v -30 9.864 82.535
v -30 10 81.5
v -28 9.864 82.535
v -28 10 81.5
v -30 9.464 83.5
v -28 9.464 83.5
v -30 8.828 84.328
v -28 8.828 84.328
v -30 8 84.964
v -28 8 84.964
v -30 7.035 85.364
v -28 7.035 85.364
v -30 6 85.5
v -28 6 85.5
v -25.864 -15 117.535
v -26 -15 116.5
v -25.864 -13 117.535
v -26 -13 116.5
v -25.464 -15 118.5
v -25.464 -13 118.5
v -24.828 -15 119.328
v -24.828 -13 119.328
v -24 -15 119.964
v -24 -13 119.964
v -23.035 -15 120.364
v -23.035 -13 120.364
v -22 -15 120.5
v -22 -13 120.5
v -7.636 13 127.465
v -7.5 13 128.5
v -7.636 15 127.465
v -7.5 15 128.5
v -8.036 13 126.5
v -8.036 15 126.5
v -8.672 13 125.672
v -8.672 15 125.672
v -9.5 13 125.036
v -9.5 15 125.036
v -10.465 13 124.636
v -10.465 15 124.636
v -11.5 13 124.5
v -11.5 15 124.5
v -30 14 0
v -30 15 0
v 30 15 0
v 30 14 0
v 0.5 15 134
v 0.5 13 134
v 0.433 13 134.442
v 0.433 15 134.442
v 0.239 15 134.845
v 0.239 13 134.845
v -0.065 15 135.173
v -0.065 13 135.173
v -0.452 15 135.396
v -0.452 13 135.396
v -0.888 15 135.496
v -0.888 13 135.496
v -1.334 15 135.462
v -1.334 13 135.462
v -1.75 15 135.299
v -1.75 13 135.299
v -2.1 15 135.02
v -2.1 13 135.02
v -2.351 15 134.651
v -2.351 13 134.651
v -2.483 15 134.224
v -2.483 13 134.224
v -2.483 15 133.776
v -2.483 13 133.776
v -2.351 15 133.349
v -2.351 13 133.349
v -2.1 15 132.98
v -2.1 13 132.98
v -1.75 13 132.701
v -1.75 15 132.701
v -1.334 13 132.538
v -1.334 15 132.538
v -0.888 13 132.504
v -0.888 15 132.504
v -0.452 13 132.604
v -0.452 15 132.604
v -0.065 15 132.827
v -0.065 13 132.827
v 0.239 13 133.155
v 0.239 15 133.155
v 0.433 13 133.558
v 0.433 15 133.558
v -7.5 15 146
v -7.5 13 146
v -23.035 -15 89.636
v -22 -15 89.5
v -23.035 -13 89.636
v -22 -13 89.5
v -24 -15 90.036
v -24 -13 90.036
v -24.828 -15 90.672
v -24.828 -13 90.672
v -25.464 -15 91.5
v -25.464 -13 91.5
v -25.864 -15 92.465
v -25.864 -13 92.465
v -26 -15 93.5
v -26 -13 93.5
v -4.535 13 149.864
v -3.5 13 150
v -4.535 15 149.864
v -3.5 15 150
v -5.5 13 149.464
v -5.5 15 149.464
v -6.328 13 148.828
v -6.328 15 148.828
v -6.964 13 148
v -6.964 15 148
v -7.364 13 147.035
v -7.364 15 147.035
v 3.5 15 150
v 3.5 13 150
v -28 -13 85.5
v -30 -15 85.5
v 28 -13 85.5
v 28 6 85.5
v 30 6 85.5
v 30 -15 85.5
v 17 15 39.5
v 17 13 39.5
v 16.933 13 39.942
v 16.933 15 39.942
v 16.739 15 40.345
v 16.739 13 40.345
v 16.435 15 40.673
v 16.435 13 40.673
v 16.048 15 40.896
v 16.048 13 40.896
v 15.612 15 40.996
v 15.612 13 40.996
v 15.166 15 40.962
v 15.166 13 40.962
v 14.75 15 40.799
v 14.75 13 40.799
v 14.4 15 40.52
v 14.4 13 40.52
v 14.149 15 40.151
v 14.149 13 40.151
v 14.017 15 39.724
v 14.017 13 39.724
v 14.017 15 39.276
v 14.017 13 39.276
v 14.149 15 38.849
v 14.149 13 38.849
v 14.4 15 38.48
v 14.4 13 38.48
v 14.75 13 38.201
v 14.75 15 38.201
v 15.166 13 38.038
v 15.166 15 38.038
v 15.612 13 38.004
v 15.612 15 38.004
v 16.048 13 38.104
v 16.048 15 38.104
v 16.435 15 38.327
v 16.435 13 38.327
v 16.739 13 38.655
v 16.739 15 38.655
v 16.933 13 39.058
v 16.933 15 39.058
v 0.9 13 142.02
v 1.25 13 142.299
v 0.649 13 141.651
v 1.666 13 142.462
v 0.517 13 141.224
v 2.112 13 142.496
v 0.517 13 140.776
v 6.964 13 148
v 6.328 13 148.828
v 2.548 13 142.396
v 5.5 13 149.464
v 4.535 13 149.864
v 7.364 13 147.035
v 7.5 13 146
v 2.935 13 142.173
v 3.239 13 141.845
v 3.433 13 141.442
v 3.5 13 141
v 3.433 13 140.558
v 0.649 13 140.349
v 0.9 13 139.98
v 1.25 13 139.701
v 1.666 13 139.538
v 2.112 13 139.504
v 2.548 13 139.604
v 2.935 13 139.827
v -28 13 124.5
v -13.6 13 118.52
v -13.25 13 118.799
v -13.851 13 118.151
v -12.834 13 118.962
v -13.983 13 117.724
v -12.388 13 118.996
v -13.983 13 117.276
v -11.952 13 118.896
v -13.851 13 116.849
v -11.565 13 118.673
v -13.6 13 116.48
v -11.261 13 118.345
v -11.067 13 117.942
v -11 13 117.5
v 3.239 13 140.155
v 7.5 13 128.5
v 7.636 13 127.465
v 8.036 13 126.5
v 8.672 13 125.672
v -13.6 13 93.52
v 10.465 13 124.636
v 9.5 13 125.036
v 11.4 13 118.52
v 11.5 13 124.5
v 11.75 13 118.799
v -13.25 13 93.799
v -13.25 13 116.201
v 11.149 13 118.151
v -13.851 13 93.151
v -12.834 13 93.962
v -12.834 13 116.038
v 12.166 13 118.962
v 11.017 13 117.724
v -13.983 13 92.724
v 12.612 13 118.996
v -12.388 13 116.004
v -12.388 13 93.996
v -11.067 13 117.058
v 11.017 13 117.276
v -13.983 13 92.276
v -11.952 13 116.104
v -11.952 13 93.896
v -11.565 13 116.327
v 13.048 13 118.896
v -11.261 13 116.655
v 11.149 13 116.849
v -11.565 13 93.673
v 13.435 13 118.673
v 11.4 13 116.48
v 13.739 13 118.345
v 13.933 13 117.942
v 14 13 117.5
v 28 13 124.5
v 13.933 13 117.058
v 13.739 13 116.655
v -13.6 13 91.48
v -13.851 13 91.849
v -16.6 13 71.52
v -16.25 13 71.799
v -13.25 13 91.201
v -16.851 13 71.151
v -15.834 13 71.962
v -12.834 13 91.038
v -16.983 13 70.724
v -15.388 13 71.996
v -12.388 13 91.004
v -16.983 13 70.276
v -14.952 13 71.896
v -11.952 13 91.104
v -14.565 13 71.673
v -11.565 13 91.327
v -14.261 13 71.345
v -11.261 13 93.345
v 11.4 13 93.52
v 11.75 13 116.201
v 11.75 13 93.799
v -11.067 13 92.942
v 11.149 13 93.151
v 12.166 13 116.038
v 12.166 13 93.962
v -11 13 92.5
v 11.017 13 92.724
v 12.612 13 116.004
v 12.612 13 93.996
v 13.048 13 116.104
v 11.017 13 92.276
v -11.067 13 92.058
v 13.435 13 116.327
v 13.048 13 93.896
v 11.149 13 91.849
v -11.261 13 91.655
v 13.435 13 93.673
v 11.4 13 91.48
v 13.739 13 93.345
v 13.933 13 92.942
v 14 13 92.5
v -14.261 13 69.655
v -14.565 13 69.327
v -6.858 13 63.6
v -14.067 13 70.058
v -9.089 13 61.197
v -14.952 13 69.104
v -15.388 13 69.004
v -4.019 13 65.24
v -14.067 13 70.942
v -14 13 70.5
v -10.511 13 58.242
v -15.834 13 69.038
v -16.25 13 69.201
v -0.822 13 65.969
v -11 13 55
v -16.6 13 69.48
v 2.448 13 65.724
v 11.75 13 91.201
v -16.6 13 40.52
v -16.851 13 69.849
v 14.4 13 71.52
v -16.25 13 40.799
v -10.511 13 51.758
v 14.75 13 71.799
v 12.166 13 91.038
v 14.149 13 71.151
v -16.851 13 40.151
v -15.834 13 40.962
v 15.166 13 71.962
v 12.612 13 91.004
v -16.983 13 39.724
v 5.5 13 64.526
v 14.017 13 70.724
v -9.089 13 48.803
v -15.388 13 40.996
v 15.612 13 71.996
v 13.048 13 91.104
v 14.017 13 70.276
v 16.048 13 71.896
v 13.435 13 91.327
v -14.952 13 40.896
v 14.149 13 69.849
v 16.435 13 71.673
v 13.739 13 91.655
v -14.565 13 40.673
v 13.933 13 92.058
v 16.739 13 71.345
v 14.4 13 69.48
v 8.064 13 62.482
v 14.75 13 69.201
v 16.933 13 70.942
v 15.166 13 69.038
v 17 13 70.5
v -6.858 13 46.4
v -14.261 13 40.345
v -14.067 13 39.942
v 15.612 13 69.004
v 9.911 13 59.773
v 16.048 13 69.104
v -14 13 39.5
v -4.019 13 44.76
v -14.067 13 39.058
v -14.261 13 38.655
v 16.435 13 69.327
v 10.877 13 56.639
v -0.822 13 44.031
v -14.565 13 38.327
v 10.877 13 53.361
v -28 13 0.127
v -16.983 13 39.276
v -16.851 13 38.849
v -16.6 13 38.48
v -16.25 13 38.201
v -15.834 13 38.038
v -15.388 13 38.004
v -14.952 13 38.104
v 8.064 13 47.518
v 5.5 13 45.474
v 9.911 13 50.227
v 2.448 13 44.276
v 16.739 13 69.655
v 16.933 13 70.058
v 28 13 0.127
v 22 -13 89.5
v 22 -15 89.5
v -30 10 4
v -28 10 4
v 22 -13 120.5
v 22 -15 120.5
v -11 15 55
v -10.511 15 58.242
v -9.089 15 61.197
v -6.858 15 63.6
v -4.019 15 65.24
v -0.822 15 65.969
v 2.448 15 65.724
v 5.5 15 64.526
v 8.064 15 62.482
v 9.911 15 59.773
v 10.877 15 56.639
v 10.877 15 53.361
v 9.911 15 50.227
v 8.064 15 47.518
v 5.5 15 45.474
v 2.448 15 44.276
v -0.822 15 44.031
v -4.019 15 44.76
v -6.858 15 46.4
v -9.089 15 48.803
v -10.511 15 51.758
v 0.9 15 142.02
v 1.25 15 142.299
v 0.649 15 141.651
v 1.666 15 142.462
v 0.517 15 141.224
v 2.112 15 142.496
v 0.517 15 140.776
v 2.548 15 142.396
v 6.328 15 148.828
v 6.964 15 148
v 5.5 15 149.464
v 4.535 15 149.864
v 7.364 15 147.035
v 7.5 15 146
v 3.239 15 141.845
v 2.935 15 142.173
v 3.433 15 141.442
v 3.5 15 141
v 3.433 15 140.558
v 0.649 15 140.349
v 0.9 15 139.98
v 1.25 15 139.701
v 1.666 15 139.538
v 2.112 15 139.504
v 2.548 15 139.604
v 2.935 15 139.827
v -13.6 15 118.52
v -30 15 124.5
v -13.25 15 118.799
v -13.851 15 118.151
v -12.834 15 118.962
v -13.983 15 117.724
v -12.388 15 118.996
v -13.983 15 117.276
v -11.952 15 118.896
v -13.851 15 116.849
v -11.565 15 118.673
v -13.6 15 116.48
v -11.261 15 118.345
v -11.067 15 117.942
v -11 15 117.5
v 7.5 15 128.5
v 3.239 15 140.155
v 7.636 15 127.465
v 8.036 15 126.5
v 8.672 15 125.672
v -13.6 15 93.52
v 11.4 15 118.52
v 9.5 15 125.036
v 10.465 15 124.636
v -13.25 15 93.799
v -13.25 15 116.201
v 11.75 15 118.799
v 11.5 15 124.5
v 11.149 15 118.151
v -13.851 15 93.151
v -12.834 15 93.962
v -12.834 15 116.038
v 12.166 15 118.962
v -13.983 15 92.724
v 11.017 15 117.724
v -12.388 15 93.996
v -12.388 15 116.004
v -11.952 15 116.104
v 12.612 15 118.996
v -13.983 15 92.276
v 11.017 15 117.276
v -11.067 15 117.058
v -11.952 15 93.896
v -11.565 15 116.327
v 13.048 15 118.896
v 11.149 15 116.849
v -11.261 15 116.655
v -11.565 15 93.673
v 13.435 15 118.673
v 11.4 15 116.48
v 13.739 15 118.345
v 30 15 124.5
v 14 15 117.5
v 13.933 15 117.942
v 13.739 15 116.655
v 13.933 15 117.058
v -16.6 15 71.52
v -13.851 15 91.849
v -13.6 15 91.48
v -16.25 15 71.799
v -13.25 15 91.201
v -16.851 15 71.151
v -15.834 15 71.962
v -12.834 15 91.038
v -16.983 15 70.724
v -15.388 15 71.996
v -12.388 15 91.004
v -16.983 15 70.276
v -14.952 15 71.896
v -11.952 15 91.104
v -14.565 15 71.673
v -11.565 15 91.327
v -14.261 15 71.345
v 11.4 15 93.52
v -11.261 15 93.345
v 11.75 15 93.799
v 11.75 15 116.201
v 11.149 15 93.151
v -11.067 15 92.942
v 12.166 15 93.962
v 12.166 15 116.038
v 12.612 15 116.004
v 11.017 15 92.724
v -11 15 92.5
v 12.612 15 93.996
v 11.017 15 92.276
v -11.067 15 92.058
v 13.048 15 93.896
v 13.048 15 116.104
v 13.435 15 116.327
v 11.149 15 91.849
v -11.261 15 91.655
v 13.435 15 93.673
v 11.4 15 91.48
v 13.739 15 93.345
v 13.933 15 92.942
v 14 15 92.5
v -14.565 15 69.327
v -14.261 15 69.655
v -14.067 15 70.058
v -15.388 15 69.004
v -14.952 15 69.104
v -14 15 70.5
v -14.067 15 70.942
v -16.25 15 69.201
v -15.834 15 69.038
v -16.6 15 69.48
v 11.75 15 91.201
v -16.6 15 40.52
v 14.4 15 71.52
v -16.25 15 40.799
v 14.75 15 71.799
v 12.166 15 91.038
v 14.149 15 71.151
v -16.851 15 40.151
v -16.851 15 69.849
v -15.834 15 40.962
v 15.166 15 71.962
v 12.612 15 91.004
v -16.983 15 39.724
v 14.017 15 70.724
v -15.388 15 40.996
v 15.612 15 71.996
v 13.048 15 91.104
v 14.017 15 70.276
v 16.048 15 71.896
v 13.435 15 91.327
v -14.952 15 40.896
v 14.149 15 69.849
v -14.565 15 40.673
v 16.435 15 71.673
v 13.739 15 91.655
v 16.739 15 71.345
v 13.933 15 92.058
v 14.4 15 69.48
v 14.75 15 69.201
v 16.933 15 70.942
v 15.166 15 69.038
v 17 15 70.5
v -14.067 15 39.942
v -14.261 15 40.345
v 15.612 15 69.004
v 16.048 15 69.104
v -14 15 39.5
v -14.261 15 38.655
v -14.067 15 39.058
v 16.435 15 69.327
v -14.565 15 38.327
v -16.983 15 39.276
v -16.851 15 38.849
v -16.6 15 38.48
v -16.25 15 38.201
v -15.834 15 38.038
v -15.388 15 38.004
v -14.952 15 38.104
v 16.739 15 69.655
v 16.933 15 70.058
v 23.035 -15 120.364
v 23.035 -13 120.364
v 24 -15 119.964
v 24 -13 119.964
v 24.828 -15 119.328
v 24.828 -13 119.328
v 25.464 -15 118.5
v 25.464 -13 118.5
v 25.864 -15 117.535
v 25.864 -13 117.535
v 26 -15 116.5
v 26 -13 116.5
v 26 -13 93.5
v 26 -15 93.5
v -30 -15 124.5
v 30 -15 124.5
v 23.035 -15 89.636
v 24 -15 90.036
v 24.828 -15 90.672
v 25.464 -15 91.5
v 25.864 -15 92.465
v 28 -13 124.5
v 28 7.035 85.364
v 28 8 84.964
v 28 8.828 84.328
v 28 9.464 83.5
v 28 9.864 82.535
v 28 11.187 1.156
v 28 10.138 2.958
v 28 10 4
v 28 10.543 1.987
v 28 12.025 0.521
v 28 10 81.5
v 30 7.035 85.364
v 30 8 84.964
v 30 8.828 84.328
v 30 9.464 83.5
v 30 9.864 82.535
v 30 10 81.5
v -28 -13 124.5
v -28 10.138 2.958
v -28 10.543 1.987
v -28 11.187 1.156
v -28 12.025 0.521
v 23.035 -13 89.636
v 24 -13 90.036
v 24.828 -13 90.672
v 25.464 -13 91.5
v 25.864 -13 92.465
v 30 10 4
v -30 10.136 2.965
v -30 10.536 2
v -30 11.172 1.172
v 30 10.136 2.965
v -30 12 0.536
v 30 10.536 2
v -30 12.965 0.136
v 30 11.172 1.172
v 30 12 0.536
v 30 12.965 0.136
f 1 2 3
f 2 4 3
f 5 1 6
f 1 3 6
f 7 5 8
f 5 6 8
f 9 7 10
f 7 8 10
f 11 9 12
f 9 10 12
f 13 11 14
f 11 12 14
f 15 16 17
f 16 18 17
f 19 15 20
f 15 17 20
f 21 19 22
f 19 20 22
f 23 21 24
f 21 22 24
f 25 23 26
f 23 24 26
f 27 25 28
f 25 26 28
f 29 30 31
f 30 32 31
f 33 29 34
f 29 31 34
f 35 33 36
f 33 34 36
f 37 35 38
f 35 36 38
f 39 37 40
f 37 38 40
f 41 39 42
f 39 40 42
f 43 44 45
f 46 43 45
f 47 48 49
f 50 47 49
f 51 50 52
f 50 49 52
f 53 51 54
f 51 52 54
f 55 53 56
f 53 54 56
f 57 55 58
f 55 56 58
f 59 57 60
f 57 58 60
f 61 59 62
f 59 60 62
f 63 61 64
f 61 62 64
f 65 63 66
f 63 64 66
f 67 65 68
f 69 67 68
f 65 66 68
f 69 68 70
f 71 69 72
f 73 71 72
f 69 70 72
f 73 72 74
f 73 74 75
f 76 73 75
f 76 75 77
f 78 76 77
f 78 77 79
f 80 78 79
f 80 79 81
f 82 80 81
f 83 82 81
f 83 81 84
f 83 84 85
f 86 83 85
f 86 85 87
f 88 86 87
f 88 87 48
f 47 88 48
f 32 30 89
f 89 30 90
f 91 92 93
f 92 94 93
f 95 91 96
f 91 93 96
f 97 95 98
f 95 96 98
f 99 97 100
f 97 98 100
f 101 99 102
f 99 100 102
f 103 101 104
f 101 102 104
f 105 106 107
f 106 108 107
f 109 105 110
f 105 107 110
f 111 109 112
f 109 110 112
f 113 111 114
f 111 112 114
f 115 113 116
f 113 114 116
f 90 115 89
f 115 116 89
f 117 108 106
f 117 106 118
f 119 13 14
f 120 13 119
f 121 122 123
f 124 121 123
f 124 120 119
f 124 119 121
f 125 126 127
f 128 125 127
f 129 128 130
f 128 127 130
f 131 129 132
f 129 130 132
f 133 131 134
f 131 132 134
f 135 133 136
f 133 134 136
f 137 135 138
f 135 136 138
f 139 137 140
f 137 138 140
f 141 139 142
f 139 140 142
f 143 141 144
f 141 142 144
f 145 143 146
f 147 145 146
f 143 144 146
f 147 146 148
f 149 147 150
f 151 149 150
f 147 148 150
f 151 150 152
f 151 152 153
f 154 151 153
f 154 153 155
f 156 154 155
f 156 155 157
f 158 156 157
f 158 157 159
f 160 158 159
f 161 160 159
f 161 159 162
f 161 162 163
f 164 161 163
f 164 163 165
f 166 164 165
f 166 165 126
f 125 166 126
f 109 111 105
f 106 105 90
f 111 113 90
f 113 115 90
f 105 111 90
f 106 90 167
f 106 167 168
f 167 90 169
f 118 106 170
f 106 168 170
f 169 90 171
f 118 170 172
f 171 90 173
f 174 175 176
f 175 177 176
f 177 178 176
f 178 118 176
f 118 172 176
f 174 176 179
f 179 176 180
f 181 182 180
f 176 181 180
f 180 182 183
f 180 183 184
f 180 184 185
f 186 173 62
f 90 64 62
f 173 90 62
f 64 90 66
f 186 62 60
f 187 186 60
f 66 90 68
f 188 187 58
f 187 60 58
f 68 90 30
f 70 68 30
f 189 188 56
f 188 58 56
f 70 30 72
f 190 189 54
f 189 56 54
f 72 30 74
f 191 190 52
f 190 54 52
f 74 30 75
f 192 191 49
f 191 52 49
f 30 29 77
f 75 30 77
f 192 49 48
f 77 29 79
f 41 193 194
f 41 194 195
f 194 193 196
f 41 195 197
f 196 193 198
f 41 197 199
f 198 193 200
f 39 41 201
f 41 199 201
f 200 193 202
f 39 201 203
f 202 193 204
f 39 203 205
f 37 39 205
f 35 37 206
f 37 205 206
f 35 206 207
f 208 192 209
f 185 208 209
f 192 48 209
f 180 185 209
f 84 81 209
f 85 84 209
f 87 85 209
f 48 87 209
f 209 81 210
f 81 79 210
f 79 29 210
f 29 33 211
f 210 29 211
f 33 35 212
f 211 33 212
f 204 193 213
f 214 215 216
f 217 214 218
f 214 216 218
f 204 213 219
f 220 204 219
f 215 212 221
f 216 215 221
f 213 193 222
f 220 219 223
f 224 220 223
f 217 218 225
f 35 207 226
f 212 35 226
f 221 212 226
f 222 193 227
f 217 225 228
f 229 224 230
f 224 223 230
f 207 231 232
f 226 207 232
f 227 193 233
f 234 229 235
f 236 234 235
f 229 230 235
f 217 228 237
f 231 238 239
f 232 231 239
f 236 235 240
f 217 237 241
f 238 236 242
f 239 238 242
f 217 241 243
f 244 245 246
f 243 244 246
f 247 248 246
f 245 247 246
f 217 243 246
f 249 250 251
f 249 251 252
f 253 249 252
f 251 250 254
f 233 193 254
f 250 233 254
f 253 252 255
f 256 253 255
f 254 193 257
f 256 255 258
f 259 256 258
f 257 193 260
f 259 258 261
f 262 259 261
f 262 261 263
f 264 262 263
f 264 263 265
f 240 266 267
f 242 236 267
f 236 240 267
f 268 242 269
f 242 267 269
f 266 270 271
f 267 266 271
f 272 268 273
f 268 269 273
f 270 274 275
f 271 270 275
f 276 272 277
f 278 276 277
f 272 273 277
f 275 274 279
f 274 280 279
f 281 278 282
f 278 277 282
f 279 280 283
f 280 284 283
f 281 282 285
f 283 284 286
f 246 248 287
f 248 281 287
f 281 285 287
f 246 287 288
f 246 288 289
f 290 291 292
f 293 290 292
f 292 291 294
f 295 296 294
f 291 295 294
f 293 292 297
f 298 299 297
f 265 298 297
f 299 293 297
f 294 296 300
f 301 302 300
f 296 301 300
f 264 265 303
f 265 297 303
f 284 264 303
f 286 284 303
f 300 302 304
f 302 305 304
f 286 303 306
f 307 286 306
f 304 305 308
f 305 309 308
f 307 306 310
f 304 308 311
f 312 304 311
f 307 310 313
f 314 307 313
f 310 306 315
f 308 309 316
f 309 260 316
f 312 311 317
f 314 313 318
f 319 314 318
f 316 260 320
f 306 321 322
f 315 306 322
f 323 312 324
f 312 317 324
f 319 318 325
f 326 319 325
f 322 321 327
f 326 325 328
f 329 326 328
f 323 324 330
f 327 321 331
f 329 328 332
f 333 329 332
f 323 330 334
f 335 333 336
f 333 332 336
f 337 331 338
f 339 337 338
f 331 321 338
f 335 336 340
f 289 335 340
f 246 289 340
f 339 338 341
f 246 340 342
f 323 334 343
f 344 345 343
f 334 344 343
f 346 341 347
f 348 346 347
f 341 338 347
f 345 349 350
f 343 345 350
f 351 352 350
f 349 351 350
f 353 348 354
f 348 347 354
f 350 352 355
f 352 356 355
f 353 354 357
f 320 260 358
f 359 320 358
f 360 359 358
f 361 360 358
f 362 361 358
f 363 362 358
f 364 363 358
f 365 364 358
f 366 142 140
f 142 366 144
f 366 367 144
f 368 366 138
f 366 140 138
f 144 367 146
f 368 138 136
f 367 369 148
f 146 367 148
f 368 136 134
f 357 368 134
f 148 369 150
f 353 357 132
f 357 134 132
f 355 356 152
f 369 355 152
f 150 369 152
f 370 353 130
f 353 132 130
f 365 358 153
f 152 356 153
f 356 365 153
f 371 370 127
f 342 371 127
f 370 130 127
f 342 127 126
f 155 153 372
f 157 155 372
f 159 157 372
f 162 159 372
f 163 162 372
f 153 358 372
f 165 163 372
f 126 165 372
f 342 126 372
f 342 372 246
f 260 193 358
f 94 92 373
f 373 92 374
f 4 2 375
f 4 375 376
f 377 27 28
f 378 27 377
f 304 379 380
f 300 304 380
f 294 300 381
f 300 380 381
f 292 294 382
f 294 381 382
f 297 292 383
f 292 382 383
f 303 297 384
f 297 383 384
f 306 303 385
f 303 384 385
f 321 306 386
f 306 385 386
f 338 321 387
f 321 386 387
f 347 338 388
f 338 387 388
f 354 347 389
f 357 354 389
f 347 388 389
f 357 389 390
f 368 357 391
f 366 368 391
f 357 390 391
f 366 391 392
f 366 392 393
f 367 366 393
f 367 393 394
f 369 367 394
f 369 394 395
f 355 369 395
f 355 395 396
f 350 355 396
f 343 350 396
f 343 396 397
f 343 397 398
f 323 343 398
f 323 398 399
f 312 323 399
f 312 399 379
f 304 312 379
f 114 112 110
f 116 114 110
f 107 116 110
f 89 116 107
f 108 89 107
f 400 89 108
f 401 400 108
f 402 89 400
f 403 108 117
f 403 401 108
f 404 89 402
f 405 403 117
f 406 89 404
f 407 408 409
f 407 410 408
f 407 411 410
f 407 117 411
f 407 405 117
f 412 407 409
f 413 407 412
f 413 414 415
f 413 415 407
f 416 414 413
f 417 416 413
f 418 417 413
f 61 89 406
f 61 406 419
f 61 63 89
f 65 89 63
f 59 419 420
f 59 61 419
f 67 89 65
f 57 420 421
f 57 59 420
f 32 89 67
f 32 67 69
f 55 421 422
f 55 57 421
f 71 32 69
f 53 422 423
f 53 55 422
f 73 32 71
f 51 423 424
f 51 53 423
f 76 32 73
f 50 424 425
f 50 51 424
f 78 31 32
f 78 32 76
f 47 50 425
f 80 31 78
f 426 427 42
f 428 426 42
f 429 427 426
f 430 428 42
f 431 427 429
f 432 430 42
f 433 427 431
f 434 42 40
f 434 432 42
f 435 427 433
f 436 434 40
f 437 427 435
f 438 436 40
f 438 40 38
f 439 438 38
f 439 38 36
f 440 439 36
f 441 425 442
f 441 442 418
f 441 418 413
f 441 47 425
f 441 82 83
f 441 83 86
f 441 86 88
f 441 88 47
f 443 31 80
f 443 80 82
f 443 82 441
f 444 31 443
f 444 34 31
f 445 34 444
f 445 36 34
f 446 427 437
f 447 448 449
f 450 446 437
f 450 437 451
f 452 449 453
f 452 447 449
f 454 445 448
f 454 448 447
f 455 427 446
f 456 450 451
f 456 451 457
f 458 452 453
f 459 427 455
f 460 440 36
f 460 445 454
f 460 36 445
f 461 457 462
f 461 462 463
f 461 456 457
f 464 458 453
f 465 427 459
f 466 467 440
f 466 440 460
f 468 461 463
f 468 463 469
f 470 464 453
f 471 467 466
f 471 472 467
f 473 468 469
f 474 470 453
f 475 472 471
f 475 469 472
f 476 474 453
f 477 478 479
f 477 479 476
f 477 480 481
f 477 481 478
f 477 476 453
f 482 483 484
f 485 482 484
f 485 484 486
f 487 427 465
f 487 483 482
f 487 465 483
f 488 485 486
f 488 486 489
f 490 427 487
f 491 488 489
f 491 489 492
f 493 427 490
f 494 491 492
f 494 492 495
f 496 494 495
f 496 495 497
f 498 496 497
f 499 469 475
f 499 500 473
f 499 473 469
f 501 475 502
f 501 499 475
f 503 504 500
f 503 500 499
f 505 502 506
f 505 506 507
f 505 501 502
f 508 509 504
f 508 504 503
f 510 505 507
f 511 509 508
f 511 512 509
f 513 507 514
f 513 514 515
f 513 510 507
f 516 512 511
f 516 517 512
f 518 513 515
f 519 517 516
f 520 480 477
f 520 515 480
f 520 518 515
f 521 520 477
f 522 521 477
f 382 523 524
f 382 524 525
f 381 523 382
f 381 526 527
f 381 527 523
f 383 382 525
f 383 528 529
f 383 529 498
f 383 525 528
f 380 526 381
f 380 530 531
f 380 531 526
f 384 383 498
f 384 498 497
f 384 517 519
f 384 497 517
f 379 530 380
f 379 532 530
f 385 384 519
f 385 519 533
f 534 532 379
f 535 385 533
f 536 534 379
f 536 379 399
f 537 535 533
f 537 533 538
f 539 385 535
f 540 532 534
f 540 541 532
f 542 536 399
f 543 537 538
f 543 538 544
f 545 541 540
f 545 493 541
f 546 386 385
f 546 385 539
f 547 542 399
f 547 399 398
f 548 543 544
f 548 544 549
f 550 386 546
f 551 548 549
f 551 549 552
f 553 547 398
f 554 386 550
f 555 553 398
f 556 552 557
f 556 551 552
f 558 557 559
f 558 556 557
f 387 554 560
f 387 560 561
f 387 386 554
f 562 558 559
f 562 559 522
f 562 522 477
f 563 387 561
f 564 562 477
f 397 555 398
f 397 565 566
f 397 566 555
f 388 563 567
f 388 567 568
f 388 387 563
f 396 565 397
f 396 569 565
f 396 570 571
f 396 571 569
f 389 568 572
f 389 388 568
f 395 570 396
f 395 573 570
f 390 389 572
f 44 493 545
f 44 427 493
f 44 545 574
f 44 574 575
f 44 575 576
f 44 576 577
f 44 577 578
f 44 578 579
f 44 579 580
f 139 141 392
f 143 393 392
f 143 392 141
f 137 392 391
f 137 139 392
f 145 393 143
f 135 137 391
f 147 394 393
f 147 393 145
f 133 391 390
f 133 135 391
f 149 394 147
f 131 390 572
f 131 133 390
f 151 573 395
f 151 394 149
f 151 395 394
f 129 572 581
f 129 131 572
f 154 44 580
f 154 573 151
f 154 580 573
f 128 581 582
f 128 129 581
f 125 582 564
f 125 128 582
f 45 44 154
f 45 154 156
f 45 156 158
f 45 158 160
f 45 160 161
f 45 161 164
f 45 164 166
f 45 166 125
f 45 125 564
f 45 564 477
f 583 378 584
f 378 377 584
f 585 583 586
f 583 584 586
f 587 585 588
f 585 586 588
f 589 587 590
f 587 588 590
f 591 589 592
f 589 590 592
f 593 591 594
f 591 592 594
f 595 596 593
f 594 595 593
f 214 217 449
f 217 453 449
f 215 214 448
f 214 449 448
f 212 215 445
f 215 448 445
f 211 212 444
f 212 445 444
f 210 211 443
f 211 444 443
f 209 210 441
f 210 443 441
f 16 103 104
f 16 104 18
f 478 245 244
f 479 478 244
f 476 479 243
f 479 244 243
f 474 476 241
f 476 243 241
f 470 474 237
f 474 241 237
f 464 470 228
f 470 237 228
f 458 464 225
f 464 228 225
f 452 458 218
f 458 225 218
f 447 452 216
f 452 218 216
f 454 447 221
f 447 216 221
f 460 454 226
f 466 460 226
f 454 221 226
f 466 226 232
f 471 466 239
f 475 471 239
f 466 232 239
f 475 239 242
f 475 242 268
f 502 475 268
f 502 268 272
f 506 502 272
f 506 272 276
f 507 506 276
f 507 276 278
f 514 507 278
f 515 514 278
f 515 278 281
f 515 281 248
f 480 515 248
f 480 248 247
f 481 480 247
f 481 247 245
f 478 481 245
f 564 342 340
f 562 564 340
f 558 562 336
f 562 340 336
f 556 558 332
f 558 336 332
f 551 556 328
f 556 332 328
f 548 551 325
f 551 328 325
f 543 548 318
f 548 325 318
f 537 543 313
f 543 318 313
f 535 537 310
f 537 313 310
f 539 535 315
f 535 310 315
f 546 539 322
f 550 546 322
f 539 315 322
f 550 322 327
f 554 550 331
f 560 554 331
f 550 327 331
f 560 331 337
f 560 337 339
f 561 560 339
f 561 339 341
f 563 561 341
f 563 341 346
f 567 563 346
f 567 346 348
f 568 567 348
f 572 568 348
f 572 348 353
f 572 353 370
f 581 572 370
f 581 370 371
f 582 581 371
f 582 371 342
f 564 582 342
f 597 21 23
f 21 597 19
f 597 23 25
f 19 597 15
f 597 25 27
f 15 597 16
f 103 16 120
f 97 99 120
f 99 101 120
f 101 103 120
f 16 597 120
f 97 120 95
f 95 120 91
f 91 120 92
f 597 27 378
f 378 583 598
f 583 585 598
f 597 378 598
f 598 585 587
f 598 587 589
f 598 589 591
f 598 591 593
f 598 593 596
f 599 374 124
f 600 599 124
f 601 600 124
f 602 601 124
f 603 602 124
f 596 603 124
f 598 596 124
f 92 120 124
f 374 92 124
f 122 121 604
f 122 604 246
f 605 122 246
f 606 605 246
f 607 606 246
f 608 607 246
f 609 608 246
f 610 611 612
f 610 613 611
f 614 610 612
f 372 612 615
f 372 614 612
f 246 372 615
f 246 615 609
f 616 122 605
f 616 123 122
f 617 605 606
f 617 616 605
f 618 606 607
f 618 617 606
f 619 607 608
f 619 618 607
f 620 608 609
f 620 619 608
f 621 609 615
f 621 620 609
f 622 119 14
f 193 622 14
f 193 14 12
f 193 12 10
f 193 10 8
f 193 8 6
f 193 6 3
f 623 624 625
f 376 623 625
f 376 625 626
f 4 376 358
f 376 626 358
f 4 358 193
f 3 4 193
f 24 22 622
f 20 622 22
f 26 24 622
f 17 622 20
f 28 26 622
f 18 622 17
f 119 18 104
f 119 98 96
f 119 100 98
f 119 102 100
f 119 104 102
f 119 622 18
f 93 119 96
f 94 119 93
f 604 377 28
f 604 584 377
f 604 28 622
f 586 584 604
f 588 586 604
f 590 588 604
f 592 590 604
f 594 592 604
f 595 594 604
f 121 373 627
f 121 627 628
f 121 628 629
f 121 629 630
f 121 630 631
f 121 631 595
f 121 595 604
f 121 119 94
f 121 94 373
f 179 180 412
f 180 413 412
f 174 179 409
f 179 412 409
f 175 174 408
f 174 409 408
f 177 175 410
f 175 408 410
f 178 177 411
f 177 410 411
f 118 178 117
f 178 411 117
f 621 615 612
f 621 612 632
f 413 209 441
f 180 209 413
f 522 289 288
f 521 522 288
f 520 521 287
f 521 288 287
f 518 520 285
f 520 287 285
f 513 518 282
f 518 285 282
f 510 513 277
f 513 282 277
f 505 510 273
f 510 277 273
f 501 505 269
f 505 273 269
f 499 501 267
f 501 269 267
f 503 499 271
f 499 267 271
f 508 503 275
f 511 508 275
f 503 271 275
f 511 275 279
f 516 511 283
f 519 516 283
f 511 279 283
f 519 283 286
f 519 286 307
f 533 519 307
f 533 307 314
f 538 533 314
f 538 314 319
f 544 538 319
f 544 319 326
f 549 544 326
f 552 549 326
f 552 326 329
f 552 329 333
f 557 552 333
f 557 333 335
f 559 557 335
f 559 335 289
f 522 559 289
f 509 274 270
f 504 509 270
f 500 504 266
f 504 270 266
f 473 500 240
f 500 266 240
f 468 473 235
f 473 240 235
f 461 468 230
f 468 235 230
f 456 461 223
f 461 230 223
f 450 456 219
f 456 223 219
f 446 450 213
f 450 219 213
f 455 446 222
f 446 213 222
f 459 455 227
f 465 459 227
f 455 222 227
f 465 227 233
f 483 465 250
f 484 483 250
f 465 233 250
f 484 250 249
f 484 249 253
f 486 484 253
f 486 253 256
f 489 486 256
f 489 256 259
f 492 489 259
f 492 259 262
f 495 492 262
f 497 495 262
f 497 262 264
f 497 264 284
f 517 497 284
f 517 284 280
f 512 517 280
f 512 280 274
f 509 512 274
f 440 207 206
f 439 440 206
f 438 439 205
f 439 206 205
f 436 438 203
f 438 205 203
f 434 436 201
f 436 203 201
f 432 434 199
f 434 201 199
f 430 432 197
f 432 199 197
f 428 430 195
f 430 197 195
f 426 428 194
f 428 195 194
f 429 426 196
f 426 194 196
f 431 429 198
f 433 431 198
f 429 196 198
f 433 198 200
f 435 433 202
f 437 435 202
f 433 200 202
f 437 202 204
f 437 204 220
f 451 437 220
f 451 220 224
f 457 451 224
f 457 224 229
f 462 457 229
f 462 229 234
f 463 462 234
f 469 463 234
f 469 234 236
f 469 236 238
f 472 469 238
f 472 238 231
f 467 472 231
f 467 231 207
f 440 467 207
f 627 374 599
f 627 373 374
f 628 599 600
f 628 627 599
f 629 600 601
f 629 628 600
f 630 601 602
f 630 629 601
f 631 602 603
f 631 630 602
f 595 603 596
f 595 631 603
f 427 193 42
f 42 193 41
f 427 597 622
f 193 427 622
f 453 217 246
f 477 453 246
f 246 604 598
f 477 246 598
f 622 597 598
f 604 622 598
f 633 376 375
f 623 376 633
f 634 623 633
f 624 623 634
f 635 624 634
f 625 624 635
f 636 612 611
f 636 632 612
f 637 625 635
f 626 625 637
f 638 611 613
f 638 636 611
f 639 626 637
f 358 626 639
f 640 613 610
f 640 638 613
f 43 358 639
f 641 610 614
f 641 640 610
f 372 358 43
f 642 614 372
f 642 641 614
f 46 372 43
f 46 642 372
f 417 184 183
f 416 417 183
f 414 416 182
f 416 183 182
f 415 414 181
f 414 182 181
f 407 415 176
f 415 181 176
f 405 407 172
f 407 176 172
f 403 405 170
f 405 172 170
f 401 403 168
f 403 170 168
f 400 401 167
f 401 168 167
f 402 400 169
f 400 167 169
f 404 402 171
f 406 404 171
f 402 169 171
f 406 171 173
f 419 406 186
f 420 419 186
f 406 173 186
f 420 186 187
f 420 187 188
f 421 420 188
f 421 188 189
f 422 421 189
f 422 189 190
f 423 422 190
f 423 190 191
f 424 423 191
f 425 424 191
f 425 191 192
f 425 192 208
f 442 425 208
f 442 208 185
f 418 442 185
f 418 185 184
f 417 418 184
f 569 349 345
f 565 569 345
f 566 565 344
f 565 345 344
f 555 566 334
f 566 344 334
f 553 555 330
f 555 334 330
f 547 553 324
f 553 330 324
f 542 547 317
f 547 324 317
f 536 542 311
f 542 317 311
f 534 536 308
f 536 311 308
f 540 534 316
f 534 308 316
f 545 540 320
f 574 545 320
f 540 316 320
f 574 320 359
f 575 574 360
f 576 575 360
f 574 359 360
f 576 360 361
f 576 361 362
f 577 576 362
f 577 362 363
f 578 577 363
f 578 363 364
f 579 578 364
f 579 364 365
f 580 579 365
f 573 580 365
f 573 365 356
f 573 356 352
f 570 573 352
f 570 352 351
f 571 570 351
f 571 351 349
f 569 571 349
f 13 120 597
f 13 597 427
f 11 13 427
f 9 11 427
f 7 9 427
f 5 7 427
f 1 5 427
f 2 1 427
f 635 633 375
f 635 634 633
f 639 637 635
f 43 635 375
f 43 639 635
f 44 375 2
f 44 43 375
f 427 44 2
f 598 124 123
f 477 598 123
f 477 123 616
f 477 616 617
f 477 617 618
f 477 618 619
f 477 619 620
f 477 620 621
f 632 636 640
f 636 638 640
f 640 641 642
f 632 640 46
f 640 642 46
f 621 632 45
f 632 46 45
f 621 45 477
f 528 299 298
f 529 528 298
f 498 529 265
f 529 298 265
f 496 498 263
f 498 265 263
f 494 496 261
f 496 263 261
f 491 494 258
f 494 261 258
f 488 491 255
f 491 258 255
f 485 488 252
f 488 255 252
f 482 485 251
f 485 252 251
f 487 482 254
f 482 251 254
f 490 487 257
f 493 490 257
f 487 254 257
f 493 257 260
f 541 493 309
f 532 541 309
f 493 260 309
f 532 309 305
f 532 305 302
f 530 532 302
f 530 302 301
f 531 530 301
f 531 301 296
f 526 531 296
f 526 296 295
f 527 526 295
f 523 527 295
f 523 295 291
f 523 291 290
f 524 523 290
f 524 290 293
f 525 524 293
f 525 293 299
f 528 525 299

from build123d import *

# Parameters (mm, degrees)
F0_W      = 60
F0_H      = 30
F1_DEPTH  = 150
F2_T      = -2
F4_D      = 3
F3_R      = 11
F5_DEPTH  = 30.001
F6_D      = 3
F7_D      = 3
F8_W      = 52
F8_H      = 31
F8_R      = 1.5
F8_W_2    = 60
F8_H_2    = 85.5
F8_R_2    = 11
F8_W_3    = 15
F8_H_3    = 25.5
F8_W_4    = 22.5
F9_DEPTH  = 25
F10_DEPTH = 30.001
F11_F1_R  = 4
F11_F2_R  = 4
F11_F3_R  = 4
F11_F4_R  = 4
F11_F5_R  = 4
F11_F6_R  = 4
F11_F7_R  = 4
F11_F8_R  = 4
F11_F9_R  = 4
F11_F10_R = 4
F11_F11_R = 4


with BuildPart() as f1:
    # F0 (on Top) → F1 (new body)
    with BuildSketch(Plane.XY):
        Rectangle(F0_W, F0_H)
    extrude(amount=F1_DEPTH)

    # F2
    f2_openings = [f1.faces().sort_by_distance(p)[0] for p in [
        (0, 0, 150),
        (0, 0, 0),
    ]]
    offset(amount=F2_T, openings=f2_openings)

    # F4 (through all)
    with Locations(Plane(origin=(0, 15, 0), x_dir=(-1, 0, 0), z_dir=(0, 1, 0))):
        with Locations((-12.5, 117.5), (12.5, 117.5), (-12.5, 92.5), (12.5, 92.5)):
            Hole(F4_D / 2)

    # F3 (on face) → F5 (cut, through all)
    with BuildSketch(Plane(origin=(0, 15, 0), x_dir=(-1, 0, 0), z_dir=(0, 1, 0))):
        with Locations((0, 55)):
            Circle(F3_R)
    extrude(amount=-F5_DEPTH, mode=Mode.SUBTRACT)

    # F6 (through all)
    with Locations(Plane(origin=(0, 15, 0), x_dir=(-1, 0, 0), z_dir=(0, 1, 0))):
        with Locations((-15.5, 70.5), (15.5, 70.5), (-15.5, 39.5), (15.5, 39.5)):
            Hole(F6_D / 2)

    # F7 (through all)
    with Locations(Plane(origin=(0, 15, 0), x_dir=(-1, 0, 0), z_dir=(0, 1, 0))):
        with Locations((-2, 141), (1, 134)):
            Hole(F7_D / 2)

    # F8 (on face) → F9 (cut)
    with BuildSketch(Plane.XZ.offset(15)):
        with Locations((0, 105)):
            Rectangle(F8_W, F8_H)
        with Locations((-12.5, 92.5)):
            Circle(F8_R, mode=Mode.SUBTRACT)
        with Locations((-12.5, 117.5)):
            Circle(F8_R, mode=Mode.SUBTRACT)
        with Locations((12.5, 92.5)):
            Circle(F8_R, mode=Mode.SUBTRACT)
        with Locations((12.5, 117.5)):
            Circle(F8_R, mode=Mode.SUBTRACT)
        with Locations((0, 42.75)):
            Rectangle(F8_W_2, F8_H_2)
        with Locations((-15.5, 39.5)):
            Circle(F8_R, mode=Mode.SUBTRACT)
        with Locations((-15.5, 70.5)):
            Circle(F8_R, mode=Mode.SUBTRACT)
        with Locations((0, 55)):
            Circle(F8_R_2, mode=Mode.SUBTRACT)
        with Locations((15.5, 39.5)):
            Circle(F8_R, mode=Mode.SUBTRACT)
        with Locations((15.5, 70.5)):
            Circle(F8_R, mode=Mode.SUBTRACT)
        with Locations((0, 137.25)):
            Rectangle(F8_W_3, F8_H_3)
        with Locations((-1, 134)):
            Circle(F8_R, mode=Mode.SUBTRACT)
        with Locations((2, 141)):
            Circle(F8_R, mode=Mode.SUBTRACT)
        with Locations((18.75, 137.25)):
            Rectangle(F8_W_4, F8_H_3)
        with Locations((-18.75, 137.25)):
            Rectangle(F8_W_4, F8_H_3)
    extrude(amount=-F9_DEPTH, mode=Mode.SUBTRACT)

    # F8 (on face) → F10 (cut, through all)
    with BuildSketch(Plane.XZ.offset(15)):
        with Locations((-18.75, 137.25)):
            Rectangle(F8_W_4, F8_H_3)
        with Locations((18.75, 137.25)):
            Rectangle(F8_W_4, F8_H_3)
    extrude(amount=-F10_DEPTH, mode=Mode.SUBTRACT)

    # F11: fillet of radius 4 on 12 edges, made by hand

    # F11_f1
    f11_f1_edges = [f1.edges().sort_by_distance(p)[0] for p in [
        (29, 10, 0),
    ]]
    fillet(f11_f1_edges, radius=F11_F1_R)

    # F11_f2
    f11_f2_edges = [f1.edges().sort_by_distance(p)[0] for p in [
        (29, 10, 85.5),
    ]]
    fillet(f11_f2_edges, radius=F11_F2_R)

    # F11_f3
    f11_f3_edges = [f1.edges().sort_by_distance(p)[0] for p in [
        (7.5, 14, 124.5),
    ]]
    fillet(f11_f3_edges, radius=F11_F3_R)

    # F11_f4
    f11_f4_edges = [f1.edges().sort_by_distance(p)[0] for p in [
        (7.5, 14, 150),
    ]]
    fillet(f11_f4_edges, radius=F11_F4_R)

    # F11_f5
    f11_f5_edges = [f1.edges().sort_by_distance(p)[0] for p in [
        (-7.5, 14, 150),
    ]]
    fillet(f11_f5_edges, radius=F11_F5_R)

    # F11_f6
    f11_f6_edges = [f1.edges().sort_by_distance(p)[0] for p in [
        (-7.5, 14, 124.5),
    ]]
    fillet(f11_f6_edges, radius=F11_F6_R)

    # F11_f7
    f11_f7_edges = [f1.edges().sort_by_distance(p)[0] for p in [
        (-29, 10, 85.5),
    ]]
    fillet(f11_f7_edges, radius=F11_F7_R)

    # F11_f8
    f11_f8_edges = [f1.edges().sort_by_distance(p)[0] for p in [
        (26, -14, 89.5),
    ]]
    fillet(f11_f8_edges, radius=F11_F8_R)

    # F11_f9
    f11_f9_edges = [f1.edges().sort_by_distance(p)[0] for p in [
        (-26, -14, 89.5),
    ]]
    fillet(f11_f9_edges, radius=F11_F9_R)

    # F11_f10
    f11_f10_edges = [f1.edges().sort_by_distance(p)[0] for p in [
        (-26, -14, 120.5),
    ]]
    fillet(f11_f10_edges, radius=F11_F10_R)

    # F11_f11
    f11_f11_edges = [f1.edges().sort_by_distance(p)[0] for p in [
        (26, -14, 120.5),
    ]]
    fillet(f11_f11_edges, radius=F11_F11_R)


solid = f1.part
